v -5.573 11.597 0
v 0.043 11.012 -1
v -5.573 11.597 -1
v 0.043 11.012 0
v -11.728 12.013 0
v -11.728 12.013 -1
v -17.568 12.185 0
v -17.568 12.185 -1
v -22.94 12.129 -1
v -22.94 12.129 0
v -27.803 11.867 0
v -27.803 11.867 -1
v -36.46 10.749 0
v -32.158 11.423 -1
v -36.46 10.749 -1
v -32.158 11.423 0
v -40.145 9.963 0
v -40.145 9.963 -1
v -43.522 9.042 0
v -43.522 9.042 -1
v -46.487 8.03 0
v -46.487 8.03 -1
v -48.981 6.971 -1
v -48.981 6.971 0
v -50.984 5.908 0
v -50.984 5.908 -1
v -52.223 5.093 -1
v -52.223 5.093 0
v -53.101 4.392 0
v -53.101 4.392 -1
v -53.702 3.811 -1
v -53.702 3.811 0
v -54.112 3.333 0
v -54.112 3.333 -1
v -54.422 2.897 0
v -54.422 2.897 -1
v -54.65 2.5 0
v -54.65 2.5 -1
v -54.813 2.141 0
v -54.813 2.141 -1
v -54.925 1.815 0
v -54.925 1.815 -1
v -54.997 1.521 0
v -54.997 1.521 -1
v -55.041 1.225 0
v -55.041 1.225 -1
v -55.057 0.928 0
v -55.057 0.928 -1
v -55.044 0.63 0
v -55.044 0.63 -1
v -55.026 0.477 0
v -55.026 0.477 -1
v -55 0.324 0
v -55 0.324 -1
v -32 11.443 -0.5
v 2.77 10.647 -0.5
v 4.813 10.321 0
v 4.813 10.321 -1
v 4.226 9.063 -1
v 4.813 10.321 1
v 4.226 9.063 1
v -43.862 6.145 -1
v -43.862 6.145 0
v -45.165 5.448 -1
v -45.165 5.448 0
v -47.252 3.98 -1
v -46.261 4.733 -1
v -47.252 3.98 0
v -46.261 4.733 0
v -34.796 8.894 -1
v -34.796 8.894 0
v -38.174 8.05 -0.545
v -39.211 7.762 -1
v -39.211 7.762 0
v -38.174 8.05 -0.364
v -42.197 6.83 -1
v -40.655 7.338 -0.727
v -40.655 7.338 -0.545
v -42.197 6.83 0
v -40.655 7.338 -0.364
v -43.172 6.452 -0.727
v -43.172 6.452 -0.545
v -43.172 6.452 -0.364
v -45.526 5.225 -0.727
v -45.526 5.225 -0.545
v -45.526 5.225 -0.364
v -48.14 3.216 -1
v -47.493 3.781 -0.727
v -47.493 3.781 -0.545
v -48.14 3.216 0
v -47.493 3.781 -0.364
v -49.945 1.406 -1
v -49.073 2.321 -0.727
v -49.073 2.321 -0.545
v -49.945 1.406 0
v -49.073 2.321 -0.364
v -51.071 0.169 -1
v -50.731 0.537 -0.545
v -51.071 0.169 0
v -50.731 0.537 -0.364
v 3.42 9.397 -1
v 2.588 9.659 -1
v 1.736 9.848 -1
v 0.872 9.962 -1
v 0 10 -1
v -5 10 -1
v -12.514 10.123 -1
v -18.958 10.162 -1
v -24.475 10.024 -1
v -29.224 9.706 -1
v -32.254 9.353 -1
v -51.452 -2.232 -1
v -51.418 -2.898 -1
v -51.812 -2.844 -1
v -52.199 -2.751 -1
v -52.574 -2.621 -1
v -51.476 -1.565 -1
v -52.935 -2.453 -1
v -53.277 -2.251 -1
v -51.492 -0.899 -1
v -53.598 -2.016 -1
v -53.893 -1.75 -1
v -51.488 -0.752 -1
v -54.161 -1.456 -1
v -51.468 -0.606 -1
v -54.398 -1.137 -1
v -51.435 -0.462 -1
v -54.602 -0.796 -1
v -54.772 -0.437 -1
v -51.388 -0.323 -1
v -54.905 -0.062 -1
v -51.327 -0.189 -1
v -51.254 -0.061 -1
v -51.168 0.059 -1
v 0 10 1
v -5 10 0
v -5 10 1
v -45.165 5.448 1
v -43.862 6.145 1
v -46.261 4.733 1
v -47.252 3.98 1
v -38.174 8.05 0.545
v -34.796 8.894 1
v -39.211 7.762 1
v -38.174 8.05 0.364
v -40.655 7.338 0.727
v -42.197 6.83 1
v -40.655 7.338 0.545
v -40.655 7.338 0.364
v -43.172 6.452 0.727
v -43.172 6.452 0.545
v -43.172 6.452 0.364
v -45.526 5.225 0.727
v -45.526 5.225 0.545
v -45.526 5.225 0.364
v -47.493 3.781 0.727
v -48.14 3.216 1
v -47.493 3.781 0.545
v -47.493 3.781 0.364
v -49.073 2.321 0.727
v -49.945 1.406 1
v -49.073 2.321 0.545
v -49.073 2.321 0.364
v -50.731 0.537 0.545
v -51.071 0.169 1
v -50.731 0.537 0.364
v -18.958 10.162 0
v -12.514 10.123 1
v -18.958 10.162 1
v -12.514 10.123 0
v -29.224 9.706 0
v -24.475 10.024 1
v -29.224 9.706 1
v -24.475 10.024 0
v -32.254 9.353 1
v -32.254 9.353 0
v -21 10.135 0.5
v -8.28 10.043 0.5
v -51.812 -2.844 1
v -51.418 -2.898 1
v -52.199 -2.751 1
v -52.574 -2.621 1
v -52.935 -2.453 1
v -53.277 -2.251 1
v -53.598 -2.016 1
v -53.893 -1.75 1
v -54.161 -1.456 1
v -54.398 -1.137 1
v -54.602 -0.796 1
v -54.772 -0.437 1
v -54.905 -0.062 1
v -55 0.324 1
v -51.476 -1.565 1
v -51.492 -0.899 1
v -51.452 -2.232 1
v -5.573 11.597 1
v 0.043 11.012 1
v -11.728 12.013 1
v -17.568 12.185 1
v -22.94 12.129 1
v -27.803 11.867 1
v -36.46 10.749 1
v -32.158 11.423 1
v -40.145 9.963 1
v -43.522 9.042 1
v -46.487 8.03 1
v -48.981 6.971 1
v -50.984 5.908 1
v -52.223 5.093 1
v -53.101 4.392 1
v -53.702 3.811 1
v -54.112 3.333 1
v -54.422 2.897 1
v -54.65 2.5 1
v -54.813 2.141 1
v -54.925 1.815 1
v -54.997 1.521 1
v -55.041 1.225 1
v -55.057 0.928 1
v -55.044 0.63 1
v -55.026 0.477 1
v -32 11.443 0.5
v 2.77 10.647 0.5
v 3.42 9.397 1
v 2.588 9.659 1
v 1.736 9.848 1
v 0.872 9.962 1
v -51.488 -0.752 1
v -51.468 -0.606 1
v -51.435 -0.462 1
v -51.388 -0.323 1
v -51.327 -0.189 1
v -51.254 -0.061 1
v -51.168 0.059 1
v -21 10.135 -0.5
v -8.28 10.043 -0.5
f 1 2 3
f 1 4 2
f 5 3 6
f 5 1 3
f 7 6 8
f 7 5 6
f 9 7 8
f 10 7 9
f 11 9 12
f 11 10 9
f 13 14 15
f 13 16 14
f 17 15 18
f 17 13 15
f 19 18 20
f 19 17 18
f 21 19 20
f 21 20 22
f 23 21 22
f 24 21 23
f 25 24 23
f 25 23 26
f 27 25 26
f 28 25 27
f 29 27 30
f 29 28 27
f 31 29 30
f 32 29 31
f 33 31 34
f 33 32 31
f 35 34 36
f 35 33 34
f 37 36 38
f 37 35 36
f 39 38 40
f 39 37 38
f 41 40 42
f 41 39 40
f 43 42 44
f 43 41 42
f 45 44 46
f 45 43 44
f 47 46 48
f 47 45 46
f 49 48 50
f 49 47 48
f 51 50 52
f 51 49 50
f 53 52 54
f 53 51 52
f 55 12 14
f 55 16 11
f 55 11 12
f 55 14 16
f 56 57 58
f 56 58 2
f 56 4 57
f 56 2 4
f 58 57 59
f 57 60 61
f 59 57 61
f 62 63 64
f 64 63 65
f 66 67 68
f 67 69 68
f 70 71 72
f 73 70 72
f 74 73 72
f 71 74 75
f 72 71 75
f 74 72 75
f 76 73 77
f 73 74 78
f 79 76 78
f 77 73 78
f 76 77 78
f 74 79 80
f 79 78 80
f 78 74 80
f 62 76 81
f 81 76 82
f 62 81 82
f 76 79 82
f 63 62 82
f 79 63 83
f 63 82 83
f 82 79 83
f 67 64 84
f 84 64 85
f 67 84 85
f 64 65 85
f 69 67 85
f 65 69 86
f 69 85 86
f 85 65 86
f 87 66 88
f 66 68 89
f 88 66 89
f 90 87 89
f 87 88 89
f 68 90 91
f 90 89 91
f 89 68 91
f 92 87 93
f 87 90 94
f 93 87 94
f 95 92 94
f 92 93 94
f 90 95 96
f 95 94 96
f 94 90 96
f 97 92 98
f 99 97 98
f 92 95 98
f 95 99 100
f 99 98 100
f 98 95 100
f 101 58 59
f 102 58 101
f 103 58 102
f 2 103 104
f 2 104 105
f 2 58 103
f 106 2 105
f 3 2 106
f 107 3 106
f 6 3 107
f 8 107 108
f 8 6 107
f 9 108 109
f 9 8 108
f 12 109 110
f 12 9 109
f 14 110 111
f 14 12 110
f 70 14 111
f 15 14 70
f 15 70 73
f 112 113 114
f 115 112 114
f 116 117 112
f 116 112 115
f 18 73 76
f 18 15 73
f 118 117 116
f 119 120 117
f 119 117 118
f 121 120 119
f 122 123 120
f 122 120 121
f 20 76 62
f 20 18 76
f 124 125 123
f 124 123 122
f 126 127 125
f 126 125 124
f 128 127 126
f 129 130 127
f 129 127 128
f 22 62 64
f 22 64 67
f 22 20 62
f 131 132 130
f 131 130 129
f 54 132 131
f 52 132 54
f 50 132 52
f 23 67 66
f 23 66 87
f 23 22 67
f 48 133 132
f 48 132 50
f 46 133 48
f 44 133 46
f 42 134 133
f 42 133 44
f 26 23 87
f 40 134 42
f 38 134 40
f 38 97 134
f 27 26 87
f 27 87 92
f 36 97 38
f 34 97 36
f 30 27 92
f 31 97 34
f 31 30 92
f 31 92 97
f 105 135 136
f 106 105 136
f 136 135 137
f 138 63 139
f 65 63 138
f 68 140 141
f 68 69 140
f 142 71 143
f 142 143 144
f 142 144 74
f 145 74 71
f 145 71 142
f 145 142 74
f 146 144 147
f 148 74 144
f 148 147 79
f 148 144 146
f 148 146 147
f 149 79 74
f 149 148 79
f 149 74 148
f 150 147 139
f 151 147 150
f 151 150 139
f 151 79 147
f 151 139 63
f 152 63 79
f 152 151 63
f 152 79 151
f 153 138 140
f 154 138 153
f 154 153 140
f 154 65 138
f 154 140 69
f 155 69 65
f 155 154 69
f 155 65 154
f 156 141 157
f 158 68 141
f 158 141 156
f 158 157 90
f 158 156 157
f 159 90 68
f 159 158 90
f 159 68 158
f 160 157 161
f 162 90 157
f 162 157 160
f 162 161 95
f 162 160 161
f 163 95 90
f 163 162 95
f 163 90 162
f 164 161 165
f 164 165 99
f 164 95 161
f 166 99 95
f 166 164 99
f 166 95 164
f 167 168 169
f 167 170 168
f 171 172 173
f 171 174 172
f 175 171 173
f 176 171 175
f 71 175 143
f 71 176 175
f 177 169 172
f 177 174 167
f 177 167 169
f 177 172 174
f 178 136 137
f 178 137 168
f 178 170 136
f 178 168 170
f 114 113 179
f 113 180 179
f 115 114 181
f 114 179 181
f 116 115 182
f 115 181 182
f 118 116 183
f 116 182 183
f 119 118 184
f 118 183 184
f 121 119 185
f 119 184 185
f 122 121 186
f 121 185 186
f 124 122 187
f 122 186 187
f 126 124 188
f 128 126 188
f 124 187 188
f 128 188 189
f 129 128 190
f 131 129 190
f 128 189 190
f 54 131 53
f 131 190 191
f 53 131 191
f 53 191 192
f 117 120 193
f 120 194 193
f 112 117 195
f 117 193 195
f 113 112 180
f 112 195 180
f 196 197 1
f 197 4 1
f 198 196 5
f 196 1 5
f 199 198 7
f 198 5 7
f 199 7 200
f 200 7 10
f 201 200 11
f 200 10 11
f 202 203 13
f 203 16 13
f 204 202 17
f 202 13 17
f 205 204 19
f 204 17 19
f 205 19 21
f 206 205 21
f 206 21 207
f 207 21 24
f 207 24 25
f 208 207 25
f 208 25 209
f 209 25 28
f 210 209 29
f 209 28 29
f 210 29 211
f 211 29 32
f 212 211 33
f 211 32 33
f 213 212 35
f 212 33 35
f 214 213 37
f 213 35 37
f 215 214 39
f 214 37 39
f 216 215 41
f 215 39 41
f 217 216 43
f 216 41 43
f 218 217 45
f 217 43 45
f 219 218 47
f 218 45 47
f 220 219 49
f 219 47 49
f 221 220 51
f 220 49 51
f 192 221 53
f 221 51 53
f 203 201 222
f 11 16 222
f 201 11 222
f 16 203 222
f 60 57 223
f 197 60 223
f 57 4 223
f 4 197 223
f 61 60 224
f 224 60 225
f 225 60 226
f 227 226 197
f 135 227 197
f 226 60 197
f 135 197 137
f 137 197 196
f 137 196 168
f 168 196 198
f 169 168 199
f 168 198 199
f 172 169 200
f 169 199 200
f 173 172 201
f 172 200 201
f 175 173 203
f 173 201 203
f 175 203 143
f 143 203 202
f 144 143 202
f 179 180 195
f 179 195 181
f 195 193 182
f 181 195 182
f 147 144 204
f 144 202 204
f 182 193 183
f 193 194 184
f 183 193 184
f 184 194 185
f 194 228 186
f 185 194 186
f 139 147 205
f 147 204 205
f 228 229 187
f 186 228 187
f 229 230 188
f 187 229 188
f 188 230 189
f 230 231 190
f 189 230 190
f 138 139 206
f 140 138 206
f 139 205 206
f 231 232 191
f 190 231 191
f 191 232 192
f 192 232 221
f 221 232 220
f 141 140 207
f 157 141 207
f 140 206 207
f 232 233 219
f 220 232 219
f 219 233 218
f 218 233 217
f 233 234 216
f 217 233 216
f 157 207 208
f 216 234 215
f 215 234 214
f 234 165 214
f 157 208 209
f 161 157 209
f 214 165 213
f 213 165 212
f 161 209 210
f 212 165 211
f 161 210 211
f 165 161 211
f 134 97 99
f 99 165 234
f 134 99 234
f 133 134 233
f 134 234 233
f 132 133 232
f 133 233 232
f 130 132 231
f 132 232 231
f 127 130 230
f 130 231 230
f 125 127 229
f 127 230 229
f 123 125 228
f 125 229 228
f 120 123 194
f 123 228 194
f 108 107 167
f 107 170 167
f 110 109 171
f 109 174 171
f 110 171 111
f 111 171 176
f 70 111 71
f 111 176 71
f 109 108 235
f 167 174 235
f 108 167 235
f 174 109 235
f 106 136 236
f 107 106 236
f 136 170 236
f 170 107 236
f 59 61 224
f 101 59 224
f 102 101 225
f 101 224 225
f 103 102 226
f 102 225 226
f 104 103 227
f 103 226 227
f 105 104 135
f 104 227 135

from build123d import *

# Parameters (mm, degrees)
P_IDAT_VYSUNUT_M1_DEPTH = 1


with BuildPart() as part:
    # Skica1 → Přidat vysunutím1 (new, symmetric)
    with BuildSketch(Plane.XY):
        with BuildLine():
            Line((0, 10), (-5, 10))
            add(Edge.make_bspline(
                [(-5, 10), (-8.333333333, 10), (-20.483124003, 10.480551078), (-31.545644915, 9.63491203), (-34.795612613, 8.894087439)],
                knots=[0, 0, 0, 0, 0.534031624, 1, 1, 1, 1], degree=3))
            add(Edge.make_bspline(
                [(-34.795612613, 8.894087439), (-35.098801198, 8.824976118), (-35.401847399, 8.754105152), (-36.527647002, 8.484205361), (-37.350041762, 8.273925014), (-38.585610164, 7.938774284), (-38.997795956, 7.823769118), (-39.823263845, 7.587149684), (-40.236463849, 7.46628865), (-41.492153235, 7.08226066), (-42.342193993, 6.798788339), (-43.587301665, 6.278073912), (-44.000007617, 6.086017609), (-44.788441649, 5.673269167), (-45.165712934, 5.453616504), (-46.968620216, 4.310881513), (-48.145197593, 3.255811413), (-49.537601283, 1.852981398), (-49.939692058, 1.414729225), (-50.445106342, 0.855114539), (-50.597252853, 0.684916497), (-50.864765777, 0.3891951), (-50.980598253, 0.263389457), (-51.071394458, 0.169367234)],
                knots=[0.476985196, 0.476985196, 0.476985196, 0.476985196, 0.5, 0.5, 0.5625, 0.5625, 0.59375, 0.59375, 0.625, 0.625, 0.6875, 0.6875, 0.71875, 0.71875, 0.75, 0.75, 0.875, 0.875, 0.9375, 0.9375, 0.96875, 0.96875, 1, 1, 1, 1], degree=3))
            ThreePointArc((-51.071394458, 0.169367234), (-51.38801111, -0.322868482), (-51.492156301, -0.898798932))
            ThreePointArc((-51.492156301, -0.898798932), (-51.464988764, -1.898665721), (-51.4184078, -2.897816303))
            ThreePointArc((-51.4184078, -2.897816303), (-53.748630988, -1.886538688), (-55, 0.324049043))
            add(Edge.make_bspline(
                [(4.812792818, 10.321067504), (-0.439515198, 11.247191119), (-32.097973841, 15.080973729), (-55.954044977, 5.23218496), (-55, 0.324049043)],
                knots=[0, 0, 0, 0, 0.525665788, 0.985260281, 0.985260281, 0.985260281, 0.985260281], degree=3))
            Line((4.812792818, 10.321067504), (4.226182617, 9.06307787))
            ThreePointArc((4.226182617, 9.06307787), (2.164396139, 9.762960071), (0, 10))
        make_face()
    extrude(amount=P_IDAT_VYSUNUT_M1_DEPTH, both=True)


solid = part.part
